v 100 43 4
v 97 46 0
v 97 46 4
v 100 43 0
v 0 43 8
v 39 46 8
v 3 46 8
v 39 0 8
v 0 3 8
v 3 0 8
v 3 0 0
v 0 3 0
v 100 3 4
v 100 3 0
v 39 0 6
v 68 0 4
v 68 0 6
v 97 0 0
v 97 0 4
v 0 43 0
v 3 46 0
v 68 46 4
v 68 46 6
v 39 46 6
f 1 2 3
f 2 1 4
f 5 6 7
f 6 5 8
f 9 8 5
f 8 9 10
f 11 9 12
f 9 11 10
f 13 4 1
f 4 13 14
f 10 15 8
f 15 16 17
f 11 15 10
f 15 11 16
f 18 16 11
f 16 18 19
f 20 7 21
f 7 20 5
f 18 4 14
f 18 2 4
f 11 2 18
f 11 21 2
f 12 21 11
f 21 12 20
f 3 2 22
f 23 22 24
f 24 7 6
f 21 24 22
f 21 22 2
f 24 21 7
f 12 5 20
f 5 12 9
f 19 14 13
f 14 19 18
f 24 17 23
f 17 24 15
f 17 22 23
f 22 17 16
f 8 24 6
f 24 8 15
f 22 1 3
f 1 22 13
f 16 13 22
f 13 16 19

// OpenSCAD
$fn = 32;

// ----------------------------------------------------------------------
// Stepped bar: twostep, 100 x 46 x 8/4 mm
// ----------------------------------------------------------------------

// --- parameters (mm) ---
bar_l = 100;              // bar length, X
bar_w = 46;               // bar width, Y
plate_t = 8;              // thickness of the thick zone, Z
thin_t = 4;               // thickness of the thin zone
corner_c = 3;             // corner chamfer of the bar
step_cut = 4;             // material removed from the thin zone
stair1_x = 39;            // position of the first stair
stair2_x = 68;            // position of the second stair
mid_t = 6;                // thickness of the middle zone
depth_1 = 2;              // depth of cut 1 from the top face
depth_2 = 4;              // depth of cut 2 from the top face

profile = [[3, 0], [97, 0], [100, 3], [100, 43], [97, 46], [3, 46], [0, 43], [0, 3]];  // primary outline, 8 points, counter clockwise
void_1 = [[39, -1], [68, -1], [68, 47], [39, 47]];  // first stair, 4 points
void_2 = [[68, -1], [101, -1], [101, 47], [68, 47]];  // second stair, 4 points

// --- the one profile operation ---
difference() {
  linear_extrude(height = plate_t) polygon(points = profile);
  translate([0, 0, plate_t - depth_1])
    linear_extrude(height = depth_1 + 1) polygon(points = void_1);
  translate([0, 0, plate_t - depth_2])
    linear_extrude(height = depth_2 + 1) polygon(points = void_2);
}
